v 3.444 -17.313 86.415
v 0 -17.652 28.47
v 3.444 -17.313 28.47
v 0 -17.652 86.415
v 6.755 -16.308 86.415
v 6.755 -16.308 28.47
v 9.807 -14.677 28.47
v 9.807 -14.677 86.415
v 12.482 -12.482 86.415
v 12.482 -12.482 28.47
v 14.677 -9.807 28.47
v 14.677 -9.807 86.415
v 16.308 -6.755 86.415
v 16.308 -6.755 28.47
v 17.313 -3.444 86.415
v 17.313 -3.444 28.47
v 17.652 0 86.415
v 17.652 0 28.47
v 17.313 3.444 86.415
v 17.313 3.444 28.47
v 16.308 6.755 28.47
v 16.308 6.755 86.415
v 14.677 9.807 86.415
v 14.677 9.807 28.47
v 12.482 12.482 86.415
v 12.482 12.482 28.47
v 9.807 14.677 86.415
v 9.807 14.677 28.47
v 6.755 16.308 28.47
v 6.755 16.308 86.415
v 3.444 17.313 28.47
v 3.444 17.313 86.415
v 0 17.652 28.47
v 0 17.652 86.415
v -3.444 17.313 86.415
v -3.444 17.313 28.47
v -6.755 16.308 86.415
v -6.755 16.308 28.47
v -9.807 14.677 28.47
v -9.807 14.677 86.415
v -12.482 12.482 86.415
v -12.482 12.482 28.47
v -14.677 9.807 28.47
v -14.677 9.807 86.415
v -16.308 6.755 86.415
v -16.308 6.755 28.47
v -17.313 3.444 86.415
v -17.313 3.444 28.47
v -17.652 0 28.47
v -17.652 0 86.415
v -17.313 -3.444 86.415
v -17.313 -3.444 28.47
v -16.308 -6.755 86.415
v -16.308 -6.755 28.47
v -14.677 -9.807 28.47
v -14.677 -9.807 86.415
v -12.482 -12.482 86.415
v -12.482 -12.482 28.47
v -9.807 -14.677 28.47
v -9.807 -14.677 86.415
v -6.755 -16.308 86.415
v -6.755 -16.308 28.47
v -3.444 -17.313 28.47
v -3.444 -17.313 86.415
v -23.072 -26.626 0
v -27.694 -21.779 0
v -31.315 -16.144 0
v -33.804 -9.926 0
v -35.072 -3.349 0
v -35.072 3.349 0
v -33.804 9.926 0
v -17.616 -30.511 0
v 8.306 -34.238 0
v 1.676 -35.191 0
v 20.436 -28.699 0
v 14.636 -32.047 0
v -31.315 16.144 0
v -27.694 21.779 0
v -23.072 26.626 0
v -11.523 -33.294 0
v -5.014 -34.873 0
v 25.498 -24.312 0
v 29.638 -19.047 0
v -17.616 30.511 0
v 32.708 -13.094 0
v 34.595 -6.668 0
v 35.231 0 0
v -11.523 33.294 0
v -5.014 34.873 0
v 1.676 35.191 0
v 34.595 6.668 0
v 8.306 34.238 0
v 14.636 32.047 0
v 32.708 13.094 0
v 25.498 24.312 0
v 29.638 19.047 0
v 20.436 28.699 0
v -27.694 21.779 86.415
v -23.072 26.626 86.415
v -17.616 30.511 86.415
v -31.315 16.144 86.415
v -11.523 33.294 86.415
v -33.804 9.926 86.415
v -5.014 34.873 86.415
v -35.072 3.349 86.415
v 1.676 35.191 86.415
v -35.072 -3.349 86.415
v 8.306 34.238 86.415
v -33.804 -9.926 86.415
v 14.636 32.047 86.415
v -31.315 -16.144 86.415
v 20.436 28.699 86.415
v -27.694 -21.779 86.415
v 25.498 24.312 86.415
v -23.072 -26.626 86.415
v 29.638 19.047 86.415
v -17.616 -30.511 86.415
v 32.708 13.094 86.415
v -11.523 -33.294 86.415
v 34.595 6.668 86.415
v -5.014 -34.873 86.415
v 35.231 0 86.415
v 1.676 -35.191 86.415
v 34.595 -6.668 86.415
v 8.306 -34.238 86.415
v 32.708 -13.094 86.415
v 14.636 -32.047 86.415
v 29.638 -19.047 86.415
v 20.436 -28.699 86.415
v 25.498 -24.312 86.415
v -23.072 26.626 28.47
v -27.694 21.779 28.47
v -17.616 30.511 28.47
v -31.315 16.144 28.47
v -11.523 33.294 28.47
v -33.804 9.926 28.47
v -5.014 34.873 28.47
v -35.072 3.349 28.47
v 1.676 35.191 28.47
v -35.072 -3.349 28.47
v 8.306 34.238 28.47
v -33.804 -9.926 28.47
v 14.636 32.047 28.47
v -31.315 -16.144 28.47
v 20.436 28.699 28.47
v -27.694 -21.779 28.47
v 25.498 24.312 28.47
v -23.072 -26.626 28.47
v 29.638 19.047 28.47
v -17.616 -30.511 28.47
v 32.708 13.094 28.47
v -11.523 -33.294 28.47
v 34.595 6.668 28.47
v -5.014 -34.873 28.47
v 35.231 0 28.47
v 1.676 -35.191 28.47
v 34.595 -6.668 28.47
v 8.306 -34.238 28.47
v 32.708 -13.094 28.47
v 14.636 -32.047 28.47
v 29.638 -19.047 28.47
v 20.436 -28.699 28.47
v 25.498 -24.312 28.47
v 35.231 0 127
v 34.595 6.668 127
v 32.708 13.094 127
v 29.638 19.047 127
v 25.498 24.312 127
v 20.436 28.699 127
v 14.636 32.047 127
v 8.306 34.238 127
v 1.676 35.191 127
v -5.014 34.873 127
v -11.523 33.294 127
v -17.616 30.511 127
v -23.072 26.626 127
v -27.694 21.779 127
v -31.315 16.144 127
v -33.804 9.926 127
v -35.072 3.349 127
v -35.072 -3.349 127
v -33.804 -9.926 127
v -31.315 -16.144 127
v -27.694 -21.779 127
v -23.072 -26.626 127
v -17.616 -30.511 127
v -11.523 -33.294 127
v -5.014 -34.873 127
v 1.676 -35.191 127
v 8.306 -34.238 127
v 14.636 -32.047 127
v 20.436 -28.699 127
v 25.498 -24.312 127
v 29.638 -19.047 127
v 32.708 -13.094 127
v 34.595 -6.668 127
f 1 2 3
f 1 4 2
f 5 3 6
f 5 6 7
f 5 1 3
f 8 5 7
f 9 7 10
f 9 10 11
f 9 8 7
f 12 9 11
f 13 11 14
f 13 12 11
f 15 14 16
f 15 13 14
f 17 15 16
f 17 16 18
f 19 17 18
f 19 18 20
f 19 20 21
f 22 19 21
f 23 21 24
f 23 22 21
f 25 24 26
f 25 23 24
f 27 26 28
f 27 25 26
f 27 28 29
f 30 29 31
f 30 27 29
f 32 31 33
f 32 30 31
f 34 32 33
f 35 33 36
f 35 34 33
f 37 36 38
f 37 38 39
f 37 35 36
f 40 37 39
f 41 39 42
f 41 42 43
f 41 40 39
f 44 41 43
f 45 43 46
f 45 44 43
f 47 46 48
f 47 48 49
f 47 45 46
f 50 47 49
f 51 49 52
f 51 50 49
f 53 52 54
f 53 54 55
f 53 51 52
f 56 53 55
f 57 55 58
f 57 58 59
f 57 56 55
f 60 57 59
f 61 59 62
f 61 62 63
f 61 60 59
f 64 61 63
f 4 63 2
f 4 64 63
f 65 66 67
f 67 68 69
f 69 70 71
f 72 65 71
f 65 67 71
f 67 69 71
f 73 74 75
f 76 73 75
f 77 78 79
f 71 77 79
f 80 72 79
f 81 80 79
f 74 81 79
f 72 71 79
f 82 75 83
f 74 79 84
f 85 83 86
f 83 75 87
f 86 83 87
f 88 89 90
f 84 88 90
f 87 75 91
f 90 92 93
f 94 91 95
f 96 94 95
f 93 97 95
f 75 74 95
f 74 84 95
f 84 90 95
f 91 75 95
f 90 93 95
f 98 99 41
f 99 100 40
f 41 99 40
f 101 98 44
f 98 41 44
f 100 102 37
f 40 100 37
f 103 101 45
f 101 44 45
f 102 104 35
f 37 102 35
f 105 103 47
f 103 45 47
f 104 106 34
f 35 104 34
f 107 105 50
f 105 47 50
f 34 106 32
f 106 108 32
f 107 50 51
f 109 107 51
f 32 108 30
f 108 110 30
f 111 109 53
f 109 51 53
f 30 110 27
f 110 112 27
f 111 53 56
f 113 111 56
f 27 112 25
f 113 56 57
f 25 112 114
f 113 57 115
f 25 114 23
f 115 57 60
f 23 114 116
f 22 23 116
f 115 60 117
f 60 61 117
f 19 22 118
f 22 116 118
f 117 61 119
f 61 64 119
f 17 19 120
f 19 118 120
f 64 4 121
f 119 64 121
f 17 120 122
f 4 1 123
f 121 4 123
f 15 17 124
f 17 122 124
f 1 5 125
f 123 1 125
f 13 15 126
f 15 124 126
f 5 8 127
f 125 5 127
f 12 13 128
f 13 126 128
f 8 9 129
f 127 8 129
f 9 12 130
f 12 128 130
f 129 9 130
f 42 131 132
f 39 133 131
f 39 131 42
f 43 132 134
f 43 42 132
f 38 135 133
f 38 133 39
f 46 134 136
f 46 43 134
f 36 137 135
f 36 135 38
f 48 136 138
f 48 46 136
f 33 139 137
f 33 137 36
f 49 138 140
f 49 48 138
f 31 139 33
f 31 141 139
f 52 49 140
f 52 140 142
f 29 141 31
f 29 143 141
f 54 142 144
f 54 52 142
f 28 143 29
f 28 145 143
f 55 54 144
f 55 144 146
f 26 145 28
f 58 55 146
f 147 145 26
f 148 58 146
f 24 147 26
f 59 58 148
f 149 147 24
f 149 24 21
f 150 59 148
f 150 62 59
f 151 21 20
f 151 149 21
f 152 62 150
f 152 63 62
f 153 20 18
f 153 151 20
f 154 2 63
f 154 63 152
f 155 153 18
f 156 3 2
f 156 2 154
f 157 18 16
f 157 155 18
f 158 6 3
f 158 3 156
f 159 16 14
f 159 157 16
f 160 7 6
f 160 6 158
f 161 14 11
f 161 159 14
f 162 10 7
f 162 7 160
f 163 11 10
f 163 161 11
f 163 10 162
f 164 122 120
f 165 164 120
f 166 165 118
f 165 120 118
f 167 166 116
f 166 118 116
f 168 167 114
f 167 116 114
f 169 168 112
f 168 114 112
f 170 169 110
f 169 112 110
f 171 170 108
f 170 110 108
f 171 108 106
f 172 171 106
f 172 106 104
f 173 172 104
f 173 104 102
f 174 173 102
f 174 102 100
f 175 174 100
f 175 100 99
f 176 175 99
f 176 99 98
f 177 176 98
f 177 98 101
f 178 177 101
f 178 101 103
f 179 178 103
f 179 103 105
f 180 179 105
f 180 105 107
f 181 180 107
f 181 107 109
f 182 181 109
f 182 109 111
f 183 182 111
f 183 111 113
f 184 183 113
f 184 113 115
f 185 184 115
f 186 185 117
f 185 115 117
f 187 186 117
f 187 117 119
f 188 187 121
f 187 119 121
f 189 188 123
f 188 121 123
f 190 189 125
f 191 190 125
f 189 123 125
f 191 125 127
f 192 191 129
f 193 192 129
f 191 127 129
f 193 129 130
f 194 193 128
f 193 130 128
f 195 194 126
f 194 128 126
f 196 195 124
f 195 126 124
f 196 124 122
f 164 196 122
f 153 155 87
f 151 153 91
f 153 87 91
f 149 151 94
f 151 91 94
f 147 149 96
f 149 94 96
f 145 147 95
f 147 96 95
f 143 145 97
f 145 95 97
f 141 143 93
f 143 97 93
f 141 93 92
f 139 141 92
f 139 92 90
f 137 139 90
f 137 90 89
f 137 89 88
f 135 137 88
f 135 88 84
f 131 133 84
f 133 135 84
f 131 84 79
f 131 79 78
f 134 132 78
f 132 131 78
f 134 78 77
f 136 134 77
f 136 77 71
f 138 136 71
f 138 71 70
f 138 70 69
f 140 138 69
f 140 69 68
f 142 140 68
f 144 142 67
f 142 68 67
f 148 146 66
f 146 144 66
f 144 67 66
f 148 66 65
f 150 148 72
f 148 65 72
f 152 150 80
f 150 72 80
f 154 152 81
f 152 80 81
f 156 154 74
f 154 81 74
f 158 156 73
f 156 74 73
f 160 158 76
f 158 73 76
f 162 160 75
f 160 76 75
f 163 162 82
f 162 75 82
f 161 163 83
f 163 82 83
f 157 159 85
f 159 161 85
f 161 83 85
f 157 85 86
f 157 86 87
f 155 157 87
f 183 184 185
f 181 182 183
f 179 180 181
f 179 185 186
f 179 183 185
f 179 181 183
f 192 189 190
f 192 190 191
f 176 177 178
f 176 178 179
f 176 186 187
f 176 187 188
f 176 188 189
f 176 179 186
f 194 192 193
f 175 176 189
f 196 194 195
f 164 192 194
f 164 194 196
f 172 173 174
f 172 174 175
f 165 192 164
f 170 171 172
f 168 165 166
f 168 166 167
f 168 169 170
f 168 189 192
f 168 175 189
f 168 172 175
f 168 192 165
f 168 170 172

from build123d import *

# Parameters (mm, degrees)
F0_R     = 35.231232
F1_DEPTH = 127
F2_W     = 17.652087
F2_H     = 57.944892


with BuildPart() as f1:
    # F0 (on Top) → F1 (new body)
    with BuildSketch(Plane.XY):
        Circle(F0_R)
    extrude(amount=F1_DEPTH)

    # F2 (on Right) → F4 (revolve, cut)
    with BuildSketch(Plane.YZ):
        with Locations((-26.47813, 57.442375)):
            Rectangle(F2_W, F2_H)
    revolve(axis=Axis((0, 0, 50.498489), (0, 0, 1)), mode=Mode.SUBTRACT)


solid = f1.part
